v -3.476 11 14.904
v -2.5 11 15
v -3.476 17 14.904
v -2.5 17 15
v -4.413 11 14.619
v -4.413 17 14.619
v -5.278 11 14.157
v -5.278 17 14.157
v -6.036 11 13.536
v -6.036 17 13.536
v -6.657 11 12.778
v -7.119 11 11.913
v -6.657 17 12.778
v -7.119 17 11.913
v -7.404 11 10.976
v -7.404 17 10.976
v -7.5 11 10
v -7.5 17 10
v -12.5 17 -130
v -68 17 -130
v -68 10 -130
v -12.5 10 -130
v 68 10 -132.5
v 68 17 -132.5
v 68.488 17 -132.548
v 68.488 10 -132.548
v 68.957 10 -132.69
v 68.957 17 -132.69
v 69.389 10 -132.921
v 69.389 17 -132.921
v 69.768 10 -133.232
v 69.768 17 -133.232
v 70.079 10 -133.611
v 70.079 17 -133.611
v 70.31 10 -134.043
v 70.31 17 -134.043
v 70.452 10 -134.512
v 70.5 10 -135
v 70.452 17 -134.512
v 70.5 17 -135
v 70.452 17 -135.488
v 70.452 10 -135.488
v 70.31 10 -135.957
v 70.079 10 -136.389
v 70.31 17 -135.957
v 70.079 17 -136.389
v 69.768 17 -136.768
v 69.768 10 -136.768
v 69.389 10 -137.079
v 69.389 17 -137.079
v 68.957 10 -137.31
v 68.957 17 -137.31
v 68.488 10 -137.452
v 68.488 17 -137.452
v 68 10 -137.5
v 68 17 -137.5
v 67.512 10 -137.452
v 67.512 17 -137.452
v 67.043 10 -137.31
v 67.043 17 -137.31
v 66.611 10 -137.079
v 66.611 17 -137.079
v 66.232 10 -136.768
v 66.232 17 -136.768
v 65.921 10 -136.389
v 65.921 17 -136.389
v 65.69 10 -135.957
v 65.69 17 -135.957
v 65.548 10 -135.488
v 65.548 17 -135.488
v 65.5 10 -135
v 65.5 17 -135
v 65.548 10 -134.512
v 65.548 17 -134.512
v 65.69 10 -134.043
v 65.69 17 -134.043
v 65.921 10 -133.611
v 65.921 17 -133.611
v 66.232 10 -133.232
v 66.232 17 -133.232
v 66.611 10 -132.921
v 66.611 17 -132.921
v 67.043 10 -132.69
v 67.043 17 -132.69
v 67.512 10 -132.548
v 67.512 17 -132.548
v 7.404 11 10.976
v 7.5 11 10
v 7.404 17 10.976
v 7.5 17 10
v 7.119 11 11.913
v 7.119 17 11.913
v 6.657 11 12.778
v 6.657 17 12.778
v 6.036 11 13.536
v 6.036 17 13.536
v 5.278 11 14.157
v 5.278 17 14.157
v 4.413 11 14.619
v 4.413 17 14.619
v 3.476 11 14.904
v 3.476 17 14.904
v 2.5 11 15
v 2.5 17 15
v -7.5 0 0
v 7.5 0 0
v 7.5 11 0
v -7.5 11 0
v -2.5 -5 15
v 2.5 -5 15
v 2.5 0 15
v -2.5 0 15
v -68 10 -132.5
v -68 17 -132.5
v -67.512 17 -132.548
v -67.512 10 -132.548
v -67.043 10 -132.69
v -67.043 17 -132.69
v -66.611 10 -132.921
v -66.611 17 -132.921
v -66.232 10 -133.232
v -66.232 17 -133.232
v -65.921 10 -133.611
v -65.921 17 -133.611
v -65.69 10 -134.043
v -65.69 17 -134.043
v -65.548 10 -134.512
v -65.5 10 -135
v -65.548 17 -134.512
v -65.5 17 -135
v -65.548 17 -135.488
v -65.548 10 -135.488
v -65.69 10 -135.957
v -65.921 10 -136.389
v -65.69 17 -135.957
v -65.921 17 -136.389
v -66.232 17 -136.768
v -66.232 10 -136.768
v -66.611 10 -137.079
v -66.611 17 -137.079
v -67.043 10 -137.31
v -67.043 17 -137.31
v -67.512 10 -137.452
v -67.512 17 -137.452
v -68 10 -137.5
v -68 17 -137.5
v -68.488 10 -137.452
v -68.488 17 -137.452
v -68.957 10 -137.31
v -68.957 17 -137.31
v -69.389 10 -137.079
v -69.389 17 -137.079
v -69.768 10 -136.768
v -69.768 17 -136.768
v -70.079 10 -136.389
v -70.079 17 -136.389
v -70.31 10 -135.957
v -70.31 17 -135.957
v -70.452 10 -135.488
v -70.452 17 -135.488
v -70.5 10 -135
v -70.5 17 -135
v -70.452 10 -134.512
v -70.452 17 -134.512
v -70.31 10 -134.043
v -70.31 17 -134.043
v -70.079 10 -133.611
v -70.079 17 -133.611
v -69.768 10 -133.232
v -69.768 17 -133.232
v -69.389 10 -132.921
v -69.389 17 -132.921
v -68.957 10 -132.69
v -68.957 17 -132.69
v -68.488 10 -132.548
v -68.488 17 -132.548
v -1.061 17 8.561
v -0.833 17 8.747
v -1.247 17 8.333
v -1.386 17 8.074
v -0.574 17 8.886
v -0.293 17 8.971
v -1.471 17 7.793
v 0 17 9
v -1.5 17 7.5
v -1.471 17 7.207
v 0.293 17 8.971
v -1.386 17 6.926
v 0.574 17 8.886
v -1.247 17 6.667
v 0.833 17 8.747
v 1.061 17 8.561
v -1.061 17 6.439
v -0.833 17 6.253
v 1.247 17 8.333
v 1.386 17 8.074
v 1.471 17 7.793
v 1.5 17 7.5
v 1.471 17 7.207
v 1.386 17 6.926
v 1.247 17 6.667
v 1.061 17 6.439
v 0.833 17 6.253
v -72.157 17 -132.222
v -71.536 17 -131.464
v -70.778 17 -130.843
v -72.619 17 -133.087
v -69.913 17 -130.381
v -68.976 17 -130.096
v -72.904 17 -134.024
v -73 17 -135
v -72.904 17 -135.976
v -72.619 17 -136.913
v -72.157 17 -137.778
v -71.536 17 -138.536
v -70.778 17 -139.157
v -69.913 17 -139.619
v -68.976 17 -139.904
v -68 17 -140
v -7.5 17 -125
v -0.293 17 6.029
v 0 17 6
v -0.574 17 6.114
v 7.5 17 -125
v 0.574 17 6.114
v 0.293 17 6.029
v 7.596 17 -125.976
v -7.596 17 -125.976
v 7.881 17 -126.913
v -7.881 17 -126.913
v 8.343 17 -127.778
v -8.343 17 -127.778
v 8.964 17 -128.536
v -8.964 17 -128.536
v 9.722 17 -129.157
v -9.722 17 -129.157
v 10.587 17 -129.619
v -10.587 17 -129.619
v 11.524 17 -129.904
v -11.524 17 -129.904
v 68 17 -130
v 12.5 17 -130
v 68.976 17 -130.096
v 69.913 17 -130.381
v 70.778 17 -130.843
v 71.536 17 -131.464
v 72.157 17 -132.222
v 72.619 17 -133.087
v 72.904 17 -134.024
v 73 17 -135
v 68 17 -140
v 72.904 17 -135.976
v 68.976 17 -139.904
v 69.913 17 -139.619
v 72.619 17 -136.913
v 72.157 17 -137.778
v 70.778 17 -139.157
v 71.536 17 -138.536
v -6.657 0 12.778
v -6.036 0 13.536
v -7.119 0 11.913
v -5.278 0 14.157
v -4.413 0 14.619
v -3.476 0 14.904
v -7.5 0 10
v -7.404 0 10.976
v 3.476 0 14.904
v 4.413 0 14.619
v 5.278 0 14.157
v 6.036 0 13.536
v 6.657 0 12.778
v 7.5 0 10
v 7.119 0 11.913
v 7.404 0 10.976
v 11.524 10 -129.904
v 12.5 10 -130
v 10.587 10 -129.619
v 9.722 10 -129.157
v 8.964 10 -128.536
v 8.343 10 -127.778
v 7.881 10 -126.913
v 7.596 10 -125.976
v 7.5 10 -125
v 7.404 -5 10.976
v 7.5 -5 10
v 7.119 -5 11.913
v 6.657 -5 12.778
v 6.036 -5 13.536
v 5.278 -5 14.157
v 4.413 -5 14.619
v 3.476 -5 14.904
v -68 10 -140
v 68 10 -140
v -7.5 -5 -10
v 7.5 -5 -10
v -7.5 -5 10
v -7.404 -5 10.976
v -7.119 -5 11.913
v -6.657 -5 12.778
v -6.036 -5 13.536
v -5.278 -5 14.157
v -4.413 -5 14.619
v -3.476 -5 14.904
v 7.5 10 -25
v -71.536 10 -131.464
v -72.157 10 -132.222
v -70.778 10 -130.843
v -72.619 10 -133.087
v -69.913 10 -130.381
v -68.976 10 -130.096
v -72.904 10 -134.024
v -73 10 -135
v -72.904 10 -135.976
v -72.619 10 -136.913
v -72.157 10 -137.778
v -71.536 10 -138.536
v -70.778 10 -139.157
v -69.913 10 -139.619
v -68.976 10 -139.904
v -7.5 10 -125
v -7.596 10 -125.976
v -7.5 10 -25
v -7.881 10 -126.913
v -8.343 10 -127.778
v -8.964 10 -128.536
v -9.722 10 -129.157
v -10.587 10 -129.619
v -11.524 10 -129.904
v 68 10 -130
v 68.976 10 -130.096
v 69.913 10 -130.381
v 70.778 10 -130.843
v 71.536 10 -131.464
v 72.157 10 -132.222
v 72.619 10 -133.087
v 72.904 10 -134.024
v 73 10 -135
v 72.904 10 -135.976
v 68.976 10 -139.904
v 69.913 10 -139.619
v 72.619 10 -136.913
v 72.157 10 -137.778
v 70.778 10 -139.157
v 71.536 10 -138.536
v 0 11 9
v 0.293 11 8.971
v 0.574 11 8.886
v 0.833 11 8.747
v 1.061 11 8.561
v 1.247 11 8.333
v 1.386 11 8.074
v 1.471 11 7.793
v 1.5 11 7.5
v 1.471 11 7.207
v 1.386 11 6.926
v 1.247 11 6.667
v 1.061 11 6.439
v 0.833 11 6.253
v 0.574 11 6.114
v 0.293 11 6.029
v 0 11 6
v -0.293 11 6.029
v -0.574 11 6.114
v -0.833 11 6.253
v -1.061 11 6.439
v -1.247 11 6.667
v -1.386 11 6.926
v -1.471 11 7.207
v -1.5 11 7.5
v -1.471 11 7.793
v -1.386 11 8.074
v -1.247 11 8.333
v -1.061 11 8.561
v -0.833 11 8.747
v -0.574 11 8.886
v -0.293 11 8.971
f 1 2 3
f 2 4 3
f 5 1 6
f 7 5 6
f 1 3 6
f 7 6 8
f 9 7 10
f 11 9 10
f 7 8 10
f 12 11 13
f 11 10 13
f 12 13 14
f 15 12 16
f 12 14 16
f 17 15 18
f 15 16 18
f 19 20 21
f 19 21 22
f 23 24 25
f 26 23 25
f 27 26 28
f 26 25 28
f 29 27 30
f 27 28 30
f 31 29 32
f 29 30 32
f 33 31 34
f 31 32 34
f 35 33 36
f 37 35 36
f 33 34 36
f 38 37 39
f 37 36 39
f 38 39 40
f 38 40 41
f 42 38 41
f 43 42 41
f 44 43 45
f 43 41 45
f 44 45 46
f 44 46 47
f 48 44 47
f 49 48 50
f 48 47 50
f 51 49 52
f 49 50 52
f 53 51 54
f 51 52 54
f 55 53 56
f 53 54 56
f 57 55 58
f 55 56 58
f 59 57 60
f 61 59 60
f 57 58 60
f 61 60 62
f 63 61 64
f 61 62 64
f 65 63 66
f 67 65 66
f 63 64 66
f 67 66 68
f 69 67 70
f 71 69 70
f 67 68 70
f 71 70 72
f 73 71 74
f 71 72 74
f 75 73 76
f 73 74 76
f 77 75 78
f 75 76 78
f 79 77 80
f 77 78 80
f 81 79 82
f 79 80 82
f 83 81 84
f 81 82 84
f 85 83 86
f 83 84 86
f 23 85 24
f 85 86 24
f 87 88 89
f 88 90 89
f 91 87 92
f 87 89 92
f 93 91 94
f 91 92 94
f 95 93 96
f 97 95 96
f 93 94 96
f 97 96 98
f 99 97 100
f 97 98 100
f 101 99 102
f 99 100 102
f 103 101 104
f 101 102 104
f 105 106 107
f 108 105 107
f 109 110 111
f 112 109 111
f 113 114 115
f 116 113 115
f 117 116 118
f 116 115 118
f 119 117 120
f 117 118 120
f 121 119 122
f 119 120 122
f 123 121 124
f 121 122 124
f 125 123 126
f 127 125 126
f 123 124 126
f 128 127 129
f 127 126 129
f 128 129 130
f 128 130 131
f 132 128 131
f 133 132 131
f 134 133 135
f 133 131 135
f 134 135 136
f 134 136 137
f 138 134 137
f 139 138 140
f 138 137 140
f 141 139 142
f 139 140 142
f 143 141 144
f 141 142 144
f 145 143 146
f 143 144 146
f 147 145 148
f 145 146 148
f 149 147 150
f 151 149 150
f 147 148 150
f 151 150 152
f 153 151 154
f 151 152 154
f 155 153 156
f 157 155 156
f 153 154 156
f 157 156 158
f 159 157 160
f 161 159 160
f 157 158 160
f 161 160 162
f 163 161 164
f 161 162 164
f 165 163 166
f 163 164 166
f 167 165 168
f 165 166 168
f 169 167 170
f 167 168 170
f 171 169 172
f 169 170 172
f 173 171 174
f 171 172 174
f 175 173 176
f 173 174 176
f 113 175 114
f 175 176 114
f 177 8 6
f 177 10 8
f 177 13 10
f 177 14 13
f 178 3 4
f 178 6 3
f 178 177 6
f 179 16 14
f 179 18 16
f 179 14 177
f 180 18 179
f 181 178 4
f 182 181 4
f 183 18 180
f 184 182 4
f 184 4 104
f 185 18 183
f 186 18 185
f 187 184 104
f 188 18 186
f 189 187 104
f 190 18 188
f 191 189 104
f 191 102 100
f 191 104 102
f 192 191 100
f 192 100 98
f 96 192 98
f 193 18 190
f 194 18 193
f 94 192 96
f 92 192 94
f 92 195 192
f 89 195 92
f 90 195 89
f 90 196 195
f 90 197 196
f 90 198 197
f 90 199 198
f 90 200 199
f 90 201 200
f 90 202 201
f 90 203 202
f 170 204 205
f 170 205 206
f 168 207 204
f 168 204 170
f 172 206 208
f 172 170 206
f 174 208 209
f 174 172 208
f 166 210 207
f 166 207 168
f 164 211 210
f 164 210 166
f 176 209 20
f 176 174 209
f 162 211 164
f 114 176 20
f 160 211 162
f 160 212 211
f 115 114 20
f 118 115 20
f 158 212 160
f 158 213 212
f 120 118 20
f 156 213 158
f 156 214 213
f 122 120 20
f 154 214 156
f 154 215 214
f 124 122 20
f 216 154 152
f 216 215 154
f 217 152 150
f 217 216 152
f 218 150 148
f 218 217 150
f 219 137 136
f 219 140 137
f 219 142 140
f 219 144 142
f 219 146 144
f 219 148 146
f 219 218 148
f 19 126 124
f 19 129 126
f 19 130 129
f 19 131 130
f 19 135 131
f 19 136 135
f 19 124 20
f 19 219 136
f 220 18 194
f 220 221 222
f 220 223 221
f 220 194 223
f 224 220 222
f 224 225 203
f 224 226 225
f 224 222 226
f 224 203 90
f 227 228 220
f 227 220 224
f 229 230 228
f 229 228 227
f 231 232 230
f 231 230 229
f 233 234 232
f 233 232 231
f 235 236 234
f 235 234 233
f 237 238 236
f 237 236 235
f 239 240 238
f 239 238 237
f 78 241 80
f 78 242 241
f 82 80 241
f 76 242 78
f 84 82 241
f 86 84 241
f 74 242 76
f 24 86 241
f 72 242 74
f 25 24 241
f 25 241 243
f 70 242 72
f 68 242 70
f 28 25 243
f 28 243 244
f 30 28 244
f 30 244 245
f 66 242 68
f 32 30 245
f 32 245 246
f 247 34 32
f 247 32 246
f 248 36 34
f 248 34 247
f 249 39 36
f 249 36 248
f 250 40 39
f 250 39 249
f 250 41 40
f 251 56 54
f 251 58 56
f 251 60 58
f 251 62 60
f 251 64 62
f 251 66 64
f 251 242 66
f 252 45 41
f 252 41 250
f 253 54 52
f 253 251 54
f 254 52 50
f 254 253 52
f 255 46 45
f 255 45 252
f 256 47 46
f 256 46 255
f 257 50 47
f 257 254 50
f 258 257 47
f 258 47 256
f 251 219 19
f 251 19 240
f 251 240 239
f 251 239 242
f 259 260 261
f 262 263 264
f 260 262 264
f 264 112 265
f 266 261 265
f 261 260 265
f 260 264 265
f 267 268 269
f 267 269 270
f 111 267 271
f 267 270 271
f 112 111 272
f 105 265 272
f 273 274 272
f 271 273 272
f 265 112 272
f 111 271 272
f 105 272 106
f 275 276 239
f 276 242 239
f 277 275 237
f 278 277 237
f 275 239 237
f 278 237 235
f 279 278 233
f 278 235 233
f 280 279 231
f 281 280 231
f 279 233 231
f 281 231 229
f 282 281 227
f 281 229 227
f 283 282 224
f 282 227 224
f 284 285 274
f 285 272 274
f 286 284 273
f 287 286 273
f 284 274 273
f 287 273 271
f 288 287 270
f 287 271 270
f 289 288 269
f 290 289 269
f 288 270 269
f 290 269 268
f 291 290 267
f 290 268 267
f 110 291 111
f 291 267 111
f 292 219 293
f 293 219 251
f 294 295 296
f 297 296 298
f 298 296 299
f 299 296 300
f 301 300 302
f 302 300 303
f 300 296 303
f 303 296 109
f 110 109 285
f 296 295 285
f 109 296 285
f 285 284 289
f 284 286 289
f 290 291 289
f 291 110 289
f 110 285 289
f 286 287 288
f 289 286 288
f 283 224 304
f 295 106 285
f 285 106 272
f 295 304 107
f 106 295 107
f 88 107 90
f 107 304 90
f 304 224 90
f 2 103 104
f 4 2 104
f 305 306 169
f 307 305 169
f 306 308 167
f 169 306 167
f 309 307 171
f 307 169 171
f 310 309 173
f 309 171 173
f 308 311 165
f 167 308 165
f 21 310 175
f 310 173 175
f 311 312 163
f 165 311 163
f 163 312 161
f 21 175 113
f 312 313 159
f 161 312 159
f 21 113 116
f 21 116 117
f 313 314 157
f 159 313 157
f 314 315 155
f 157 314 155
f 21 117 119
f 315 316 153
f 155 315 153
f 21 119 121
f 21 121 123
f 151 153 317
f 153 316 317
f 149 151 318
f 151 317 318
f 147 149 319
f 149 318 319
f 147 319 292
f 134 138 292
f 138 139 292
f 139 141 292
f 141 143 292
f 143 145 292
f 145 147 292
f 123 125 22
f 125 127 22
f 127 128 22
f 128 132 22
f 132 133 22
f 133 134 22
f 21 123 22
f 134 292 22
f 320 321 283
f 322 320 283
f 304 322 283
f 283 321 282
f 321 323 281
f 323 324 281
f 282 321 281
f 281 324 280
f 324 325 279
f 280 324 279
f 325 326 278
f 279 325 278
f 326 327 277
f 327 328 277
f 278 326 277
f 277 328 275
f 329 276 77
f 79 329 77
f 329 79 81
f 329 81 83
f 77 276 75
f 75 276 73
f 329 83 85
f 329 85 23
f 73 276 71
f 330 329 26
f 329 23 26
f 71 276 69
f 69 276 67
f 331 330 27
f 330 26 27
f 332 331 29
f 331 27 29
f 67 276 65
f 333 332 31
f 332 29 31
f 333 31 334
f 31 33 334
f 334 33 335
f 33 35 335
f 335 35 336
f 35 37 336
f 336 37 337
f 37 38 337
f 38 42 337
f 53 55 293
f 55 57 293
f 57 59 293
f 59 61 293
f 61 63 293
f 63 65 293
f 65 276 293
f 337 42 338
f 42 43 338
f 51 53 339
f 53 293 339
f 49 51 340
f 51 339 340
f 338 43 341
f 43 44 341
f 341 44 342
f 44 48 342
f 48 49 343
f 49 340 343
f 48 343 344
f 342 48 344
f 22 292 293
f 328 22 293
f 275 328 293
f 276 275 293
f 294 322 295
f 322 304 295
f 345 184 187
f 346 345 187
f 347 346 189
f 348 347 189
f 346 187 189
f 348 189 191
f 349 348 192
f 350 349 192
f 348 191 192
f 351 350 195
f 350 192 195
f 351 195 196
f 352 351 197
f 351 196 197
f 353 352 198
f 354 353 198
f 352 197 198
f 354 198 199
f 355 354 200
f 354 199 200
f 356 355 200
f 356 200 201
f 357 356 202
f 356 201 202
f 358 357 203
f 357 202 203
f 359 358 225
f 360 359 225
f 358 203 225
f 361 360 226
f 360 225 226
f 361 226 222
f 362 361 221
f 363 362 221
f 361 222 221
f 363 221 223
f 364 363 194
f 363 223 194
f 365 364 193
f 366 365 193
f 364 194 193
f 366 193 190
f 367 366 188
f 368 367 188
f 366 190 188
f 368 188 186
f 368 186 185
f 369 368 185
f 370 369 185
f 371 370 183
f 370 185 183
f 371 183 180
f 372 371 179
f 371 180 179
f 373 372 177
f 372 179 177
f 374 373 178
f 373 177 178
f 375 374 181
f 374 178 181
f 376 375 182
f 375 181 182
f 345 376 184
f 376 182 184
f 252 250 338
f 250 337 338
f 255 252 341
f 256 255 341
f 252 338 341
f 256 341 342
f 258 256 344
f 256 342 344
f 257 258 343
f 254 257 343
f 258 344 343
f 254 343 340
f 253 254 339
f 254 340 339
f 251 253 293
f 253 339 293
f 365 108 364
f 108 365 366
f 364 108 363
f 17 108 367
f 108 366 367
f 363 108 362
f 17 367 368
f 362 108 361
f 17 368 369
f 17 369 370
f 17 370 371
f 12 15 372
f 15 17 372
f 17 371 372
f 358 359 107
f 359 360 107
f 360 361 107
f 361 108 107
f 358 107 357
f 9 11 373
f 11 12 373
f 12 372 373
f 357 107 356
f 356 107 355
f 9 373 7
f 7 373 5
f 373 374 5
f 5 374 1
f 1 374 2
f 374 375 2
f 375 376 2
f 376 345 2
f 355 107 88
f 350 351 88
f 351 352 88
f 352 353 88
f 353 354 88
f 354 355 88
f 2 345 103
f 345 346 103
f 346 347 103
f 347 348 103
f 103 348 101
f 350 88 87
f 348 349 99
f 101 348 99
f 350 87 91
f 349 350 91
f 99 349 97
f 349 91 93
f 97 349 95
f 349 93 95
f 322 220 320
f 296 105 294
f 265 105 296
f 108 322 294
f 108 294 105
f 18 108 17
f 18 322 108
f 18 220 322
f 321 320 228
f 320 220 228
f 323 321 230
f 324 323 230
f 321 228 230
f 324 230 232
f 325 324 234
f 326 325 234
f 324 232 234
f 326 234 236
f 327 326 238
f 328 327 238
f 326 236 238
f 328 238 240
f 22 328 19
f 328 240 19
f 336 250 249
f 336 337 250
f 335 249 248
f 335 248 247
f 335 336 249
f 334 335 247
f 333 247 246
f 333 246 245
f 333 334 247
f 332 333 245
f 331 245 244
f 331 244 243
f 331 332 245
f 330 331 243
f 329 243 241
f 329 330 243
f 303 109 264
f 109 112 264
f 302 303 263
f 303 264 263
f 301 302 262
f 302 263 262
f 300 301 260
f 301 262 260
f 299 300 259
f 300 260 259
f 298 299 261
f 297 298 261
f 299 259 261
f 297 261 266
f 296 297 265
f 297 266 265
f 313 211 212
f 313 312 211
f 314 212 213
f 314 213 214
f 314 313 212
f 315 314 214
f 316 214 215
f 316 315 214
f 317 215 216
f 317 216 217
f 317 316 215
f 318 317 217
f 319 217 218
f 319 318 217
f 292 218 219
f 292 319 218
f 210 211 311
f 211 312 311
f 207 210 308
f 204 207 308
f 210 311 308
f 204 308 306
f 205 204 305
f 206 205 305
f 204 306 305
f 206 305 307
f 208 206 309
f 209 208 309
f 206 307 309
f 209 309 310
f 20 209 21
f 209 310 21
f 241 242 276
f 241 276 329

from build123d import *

# Parameters (mm, degrees)
SALIENTE_EXTRUIR1_DEPTH = 7.5
CROQUIS4_R              = 1.5
CORTAR_EXTRUIR2_DEPTH   = 6
CROQUIS5_W              = 146
CROQUIS5_H              = 10
CROQUIS5_R              = 2.5
SALIENTE_EXTRUIR2_DEPTH = 7
REDONDEO2_R             = 5


with BuildPart() as part:
    # Croquis1 → Saliente-Extruir1 (new, symmetric)
    with BuildSketch(Plane(origin=(0, 0, 0), x_dir=(0, 0, -1), z_dir=(1, 0, 0))):
        Polygon((0, 0), (0, 11), (-15, 11), (-15, 17), (140, 17), (140, 10), (25, 10), (10, -5), (-15, -5), (-15, 0), align=None)
    extrude(amount=SALIENTE_EXTRUIR1_DEPTH, both=True)

    # Croquis4 → Cortar-Extruir2 (cut)
    with BuildSketch(Plane(origin=(0, 17, 0), x_dir=(1, 0, 0), z_dir=(0, 1, 0))):
        with Locations(Location((0, -7.5, 0), (0, 0, 270))):
            Circle(CROQUIS4_R)
    extrude(amount=-CORTAR_EXTRUIR2_DEPTH, mode=Mode.SUBTRACT)

    # Croquis5 → Saliente-Extruir2 (add)
    with BuildSketch(Plane(origin=(0, 17, 0), x_dir=(1, 0, 0), z_dir=(0, 1, 0))):
        with Locations((0, 135)):
            Rectangle(CROQUIS5_W, CROQUIS5_H)
        with Locations(Location((-68, 135, 0), (0, 0, 270))):
            Circle(CROQUIS5_R, mode=Mode.SUBTRACT)
        with Locations(Location((68, 135, 0), (0, 0, 270))):
            Circle(CROQUIS5_R, mode=Mode.SUBTRACT)
    extrude(amount=-SALIENTE_EXTRUIR2_DEPTH)

    # Redondeo2
    redondeo2_edges = [part.edges().sort_by_distance(p)[0] for p in [
        (-7.5, 13.5, -130),
        (-73, 13.5, -140),
        (-73, 13.5, -130),
        (7.5, 13.5, -130),
        (7.5, -2.5, 15),
        (-7.5, -2.5, 15),
        (-7.5, 14, 15),
        (7.5, 14, 15),
        (73, 13.5, -140),
        (73, 13.5, -130),
    ]]
    fillet(redondeo2_edges, radius=REDONDEO2_R - 0.0001)  # a hair under: the kernel refuses the full size


solid = part.part
